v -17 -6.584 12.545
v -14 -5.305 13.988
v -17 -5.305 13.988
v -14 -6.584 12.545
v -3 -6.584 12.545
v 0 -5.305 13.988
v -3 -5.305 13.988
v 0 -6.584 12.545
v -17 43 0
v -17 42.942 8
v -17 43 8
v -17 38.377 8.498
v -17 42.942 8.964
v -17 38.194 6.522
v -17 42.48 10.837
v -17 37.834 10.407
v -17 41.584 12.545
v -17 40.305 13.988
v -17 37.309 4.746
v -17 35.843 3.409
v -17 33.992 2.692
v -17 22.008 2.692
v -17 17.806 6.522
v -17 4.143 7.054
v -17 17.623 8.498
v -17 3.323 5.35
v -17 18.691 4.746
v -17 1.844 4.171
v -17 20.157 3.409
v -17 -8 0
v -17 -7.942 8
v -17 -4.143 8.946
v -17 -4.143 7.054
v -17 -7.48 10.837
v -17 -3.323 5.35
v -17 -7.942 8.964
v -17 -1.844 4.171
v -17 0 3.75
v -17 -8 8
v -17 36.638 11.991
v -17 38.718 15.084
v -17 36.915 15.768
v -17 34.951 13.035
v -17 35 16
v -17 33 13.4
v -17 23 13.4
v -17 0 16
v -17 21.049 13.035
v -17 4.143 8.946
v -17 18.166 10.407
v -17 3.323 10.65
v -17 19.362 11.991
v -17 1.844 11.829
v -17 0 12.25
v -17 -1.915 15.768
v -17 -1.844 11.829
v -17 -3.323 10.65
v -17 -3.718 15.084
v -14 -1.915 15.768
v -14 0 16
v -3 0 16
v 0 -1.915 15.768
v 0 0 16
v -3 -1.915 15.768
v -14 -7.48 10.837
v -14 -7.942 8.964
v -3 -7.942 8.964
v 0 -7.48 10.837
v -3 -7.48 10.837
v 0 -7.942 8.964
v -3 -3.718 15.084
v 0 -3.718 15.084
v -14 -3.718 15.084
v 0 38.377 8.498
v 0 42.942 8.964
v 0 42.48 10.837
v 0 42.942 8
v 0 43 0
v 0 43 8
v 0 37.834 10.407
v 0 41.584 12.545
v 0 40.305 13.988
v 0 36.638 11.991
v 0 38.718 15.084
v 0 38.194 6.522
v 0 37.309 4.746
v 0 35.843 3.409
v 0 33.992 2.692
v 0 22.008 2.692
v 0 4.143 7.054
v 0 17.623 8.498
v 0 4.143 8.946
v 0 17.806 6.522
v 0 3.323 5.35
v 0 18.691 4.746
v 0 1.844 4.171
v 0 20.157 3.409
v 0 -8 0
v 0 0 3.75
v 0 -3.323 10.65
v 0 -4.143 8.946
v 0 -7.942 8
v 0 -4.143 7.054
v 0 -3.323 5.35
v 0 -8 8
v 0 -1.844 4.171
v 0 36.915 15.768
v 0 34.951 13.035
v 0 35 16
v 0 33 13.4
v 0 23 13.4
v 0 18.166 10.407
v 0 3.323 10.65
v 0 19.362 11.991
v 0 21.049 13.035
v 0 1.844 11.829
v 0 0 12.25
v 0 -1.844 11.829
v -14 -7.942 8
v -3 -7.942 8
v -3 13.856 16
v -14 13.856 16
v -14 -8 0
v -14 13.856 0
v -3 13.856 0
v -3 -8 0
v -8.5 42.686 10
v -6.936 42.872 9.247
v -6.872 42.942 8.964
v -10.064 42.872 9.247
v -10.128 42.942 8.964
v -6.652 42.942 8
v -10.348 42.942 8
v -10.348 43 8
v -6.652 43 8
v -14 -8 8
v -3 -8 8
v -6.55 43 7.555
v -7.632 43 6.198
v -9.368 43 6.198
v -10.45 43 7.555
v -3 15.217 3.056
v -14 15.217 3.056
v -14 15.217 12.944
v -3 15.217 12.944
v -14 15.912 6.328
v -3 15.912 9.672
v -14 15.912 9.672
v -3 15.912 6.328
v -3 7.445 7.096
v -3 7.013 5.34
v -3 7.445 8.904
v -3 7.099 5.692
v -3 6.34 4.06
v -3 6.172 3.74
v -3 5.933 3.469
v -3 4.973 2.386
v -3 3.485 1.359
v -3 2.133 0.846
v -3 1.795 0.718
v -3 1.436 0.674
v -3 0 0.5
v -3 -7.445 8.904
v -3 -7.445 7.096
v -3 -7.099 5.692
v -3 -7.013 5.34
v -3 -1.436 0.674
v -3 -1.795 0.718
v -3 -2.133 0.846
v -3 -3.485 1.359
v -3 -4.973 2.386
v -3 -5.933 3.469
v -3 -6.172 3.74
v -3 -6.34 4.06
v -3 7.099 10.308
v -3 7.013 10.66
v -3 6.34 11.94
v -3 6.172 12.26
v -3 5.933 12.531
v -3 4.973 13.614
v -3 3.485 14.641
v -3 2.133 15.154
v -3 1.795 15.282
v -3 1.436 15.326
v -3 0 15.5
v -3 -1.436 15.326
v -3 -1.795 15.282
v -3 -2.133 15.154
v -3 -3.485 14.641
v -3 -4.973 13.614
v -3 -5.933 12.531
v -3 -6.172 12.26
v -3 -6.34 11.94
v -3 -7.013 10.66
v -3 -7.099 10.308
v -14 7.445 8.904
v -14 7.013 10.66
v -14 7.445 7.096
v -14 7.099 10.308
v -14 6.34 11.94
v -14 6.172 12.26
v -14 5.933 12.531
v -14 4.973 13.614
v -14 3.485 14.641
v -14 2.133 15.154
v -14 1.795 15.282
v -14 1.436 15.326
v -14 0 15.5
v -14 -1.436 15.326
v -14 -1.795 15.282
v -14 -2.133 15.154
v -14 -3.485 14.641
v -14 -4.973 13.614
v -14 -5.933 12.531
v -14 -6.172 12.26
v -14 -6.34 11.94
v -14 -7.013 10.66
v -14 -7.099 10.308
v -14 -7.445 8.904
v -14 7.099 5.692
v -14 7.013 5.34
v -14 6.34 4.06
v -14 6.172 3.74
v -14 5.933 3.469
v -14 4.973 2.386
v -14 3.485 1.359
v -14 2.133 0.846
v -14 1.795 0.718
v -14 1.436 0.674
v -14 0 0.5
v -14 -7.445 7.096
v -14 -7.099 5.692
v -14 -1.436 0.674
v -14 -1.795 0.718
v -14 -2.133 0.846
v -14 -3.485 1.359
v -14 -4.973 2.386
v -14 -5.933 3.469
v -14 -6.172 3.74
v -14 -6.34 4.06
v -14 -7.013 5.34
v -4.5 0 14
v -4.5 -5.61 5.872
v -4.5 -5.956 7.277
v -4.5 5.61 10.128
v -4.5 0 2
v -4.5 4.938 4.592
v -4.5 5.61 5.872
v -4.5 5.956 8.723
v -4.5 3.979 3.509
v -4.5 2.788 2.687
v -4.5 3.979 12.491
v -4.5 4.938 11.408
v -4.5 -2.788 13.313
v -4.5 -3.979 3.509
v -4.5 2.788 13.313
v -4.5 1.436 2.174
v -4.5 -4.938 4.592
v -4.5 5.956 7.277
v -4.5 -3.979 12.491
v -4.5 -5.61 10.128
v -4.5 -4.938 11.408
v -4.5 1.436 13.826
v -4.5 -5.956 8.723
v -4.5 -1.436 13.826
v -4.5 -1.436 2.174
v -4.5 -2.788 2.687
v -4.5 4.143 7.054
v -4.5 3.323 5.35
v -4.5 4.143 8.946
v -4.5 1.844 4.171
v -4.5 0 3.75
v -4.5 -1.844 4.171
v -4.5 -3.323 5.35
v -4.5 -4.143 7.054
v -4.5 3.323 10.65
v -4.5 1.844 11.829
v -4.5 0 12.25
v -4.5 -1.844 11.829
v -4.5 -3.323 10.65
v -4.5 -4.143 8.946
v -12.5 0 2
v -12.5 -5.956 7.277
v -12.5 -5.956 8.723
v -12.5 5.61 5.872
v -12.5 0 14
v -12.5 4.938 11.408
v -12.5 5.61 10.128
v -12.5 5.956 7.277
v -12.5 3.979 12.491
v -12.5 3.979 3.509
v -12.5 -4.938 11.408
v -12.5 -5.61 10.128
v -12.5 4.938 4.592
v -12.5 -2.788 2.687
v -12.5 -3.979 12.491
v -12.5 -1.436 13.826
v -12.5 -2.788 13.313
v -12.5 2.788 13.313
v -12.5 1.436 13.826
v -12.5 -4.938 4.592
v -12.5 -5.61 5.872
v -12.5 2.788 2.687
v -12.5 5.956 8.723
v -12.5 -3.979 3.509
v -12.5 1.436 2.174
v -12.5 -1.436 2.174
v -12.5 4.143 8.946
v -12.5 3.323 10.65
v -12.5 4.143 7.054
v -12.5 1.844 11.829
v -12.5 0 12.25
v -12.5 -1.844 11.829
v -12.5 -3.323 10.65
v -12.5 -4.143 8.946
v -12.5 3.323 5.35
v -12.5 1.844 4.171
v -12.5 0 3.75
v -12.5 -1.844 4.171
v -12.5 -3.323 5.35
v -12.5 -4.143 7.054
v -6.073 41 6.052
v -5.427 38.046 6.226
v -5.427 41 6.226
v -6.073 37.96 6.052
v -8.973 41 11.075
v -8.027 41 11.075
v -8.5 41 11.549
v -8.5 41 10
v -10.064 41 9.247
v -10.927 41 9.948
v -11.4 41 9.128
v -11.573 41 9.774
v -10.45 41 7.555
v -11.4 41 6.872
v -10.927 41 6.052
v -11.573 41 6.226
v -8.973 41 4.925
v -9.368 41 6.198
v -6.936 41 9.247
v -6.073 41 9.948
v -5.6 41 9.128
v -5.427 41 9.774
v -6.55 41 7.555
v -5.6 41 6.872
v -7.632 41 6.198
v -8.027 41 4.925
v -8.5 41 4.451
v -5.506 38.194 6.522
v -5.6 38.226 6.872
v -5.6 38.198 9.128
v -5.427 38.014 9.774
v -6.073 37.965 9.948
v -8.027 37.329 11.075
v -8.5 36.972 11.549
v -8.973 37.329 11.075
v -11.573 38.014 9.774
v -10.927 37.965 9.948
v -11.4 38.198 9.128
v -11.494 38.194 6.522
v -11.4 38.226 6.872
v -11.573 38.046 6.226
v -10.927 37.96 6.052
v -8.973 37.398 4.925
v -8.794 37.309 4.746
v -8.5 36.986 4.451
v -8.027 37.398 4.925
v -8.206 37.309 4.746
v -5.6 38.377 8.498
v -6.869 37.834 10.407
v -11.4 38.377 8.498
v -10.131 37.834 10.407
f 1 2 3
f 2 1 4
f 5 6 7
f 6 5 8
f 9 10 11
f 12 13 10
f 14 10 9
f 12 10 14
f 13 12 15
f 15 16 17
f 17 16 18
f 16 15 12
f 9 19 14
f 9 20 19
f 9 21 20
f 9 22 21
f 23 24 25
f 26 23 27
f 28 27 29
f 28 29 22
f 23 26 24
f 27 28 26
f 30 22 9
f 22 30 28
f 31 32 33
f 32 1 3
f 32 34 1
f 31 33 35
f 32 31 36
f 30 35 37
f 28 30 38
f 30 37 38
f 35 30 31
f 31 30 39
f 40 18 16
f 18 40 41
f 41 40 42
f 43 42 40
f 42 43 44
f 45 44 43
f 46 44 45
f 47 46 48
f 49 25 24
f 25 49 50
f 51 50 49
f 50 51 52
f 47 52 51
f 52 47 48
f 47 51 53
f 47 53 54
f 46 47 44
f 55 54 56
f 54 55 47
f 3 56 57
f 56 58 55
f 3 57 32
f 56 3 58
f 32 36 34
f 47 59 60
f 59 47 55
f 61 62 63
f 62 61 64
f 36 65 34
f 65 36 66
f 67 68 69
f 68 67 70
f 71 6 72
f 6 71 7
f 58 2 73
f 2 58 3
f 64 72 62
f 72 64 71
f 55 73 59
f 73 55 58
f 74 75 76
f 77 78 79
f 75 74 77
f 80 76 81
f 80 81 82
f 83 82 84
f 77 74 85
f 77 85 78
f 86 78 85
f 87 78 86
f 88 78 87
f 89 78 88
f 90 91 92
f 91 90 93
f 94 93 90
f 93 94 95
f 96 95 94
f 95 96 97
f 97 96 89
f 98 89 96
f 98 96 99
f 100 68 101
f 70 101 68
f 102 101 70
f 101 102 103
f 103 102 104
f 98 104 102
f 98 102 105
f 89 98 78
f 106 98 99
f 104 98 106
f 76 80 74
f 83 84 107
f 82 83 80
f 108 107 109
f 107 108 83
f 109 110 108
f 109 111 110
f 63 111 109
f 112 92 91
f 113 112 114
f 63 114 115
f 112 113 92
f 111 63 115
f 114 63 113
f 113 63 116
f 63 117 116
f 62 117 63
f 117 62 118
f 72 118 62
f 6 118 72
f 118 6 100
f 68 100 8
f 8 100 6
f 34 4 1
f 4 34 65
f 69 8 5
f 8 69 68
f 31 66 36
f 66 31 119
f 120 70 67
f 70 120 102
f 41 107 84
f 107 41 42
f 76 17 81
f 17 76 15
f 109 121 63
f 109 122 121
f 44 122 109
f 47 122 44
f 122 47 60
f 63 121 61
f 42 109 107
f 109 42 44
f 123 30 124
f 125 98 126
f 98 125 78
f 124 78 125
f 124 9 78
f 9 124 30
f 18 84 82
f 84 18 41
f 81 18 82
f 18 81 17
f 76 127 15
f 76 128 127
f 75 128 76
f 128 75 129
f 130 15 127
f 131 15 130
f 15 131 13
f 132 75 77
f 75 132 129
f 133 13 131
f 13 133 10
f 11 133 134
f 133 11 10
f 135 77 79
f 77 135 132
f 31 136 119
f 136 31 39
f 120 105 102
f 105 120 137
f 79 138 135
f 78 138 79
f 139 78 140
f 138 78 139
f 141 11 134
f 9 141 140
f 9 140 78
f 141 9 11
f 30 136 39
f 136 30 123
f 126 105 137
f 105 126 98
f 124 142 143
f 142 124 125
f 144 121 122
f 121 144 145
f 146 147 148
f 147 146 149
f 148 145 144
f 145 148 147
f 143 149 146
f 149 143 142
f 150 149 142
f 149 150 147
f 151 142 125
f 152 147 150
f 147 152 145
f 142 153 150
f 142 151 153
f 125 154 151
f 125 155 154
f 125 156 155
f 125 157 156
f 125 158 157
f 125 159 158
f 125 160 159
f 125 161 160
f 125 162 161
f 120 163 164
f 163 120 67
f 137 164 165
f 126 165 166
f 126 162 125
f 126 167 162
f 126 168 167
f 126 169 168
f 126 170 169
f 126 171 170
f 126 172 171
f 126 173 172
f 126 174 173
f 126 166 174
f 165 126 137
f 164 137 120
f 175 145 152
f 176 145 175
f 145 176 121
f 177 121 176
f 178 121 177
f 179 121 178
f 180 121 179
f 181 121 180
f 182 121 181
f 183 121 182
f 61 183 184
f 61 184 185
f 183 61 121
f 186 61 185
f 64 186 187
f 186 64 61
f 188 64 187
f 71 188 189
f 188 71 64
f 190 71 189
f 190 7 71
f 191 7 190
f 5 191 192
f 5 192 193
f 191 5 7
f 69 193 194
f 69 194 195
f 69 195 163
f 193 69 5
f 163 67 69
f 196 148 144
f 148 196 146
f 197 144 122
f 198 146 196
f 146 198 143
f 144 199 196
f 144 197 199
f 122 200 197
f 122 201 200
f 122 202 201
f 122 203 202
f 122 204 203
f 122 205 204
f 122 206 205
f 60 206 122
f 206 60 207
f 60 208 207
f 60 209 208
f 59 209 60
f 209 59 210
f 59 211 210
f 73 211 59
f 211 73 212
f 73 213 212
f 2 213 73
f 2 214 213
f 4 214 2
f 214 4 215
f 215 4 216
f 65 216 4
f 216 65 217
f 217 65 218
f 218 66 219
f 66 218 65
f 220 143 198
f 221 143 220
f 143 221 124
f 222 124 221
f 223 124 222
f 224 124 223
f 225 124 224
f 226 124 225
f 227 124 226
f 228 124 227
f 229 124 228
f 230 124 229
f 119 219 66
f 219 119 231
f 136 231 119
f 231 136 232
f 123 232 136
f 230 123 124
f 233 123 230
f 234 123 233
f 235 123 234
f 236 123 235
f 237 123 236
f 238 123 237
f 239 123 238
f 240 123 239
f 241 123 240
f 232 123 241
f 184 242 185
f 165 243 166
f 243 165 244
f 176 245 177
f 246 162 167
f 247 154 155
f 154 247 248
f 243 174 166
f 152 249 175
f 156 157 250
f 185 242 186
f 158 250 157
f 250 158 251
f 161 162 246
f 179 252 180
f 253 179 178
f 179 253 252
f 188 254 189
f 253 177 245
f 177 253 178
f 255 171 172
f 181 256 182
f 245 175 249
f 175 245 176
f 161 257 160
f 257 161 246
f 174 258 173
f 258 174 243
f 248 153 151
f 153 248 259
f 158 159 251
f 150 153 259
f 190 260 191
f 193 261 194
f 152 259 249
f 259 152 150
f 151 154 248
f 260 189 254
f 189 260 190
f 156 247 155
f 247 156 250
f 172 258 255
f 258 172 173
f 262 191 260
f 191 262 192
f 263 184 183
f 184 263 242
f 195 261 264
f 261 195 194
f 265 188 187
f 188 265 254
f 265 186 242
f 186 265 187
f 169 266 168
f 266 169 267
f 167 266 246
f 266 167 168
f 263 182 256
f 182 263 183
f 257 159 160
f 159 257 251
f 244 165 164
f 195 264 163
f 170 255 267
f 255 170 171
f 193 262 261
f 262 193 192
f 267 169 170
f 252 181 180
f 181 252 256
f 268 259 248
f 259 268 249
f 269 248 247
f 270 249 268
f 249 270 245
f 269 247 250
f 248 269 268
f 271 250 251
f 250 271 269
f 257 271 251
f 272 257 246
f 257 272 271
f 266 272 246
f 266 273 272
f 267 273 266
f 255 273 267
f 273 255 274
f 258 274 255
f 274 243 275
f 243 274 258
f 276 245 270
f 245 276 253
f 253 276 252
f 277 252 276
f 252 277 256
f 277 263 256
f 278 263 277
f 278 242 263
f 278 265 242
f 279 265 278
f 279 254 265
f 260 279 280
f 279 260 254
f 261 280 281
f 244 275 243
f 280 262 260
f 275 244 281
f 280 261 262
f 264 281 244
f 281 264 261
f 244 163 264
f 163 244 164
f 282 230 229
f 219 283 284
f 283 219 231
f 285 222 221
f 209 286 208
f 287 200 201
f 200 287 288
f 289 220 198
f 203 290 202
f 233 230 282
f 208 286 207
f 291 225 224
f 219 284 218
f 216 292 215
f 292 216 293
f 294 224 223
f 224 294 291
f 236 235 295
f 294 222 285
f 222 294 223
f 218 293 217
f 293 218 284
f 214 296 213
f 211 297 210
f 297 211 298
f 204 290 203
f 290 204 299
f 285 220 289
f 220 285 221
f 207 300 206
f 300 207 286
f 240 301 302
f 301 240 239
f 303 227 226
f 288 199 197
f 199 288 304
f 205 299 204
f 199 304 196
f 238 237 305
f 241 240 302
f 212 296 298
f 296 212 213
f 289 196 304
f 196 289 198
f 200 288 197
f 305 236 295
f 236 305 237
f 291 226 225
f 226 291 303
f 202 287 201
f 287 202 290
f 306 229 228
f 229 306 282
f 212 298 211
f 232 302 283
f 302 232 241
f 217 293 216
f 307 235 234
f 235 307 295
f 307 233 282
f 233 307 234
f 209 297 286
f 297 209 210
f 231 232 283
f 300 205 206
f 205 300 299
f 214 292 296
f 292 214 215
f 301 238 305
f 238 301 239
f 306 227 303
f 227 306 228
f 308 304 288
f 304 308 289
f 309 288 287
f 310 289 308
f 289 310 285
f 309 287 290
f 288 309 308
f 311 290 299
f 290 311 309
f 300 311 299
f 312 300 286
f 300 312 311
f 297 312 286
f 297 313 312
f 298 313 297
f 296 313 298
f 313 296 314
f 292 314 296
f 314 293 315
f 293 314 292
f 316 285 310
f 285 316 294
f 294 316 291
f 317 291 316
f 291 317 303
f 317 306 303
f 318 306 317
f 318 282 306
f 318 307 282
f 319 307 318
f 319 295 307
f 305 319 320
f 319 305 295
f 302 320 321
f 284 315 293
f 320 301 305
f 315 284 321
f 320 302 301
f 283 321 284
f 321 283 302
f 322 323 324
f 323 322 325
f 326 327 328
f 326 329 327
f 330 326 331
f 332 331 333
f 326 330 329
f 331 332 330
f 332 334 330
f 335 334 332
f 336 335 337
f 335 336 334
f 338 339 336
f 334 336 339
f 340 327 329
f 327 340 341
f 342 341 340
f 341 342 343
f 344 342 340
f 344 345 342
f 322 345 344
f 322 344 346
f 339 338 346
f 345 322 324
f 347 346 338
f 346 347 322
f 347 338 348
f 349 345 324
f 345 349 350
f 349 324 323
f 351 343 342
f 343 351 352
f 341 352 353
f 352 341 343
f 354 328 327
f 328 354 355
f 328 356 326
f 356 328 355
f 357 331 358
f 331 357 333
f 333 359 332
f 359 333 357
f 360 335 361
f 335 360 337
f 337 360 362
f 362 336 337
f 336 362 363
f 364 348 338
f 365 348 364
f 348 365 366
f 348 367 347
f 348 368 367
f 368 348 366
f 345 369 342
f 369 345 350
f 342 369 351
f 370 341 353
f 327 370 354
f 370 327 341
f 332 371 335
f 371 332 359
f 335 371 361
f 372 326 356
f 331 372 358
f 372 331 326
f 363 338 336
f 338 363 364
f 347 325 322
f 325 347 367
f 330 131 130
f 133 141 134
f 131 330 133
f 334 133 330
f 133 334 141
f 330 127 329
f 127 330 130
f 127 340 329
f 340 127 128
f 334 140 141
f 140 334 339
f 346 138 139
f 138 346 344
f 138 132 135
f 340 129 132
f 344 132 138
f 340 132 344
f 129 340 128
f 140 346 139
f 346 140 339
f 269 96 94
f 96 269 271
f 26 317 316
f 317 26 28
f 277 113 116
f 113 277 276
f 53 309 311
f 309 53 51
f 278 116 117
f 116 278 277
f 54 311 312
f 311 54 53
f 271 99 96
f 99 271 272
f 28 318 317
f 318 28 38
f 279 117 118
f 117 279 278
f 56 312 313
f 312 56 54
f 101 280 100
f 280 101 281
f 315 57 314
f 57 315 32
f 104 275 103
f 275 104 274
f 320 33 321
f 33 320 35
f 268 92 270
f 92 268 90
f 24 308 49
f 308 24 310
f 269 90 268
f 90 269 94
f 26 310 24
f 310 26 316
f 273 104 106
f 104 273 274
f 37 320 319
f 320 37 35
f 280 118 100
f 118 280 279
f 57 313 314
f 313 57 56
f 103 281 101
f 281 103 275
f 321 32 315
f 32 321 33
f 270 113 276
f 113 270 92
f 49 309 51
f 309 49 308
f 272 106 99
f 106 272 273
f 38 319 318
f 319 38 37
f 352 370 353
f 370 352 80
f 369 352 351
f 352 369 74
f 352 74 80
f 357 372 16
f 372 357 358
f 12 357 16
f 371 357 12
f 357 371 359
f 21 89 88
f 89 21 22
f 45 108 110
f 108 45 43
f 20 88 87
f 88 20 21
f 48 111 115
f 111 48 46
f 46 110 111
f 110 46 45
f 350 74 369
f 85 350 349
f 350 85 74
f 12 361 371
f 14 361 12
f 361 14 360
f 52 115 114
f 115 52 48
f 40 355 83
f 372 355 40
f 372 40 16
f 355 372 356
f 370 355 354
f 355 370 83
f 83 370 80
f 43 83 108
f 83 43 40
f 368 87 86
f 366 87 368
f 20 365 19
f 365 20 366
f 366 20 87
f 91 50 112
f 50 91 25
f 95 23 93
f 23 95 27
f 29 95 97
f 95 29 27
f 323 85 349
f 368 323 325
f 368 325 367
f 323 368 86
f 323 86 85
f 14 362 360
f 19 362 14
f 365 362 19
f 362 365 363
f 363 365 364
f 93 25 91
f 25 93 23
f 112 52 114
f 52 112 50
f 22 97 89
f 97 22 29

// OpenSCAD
// PRUSA iteration3
// Y idler
// GNU GPL v3
// Josef Průša <iam@josefprusa.cz> and contributors
// http://www.reprap.org/wiki/Prusa_Mendel
// http://prusamendel.org

wall_thickness=3;
opening_width=11;
external_width=opening_width+wall_thickness*2;
opening_diameter = 32;
bearing_width = 8;
bearing_ID = 8.5;

tensionner_length = 10;

// increase the elongation if the bearing opening intersect with the M10 rod opening.
elongation = 1;


module nut(d,h,horizontal=true){
    cornerdiameter =  (d / 2) / cos (180 / 6);
    cylinder(h = h, r = cornerdiameter, $fn = 6);
    if(horizontal){
        for(i = [1:6]){
            rotate([0,0,60*i]) translate([-cornerdiameter-0.2,0,0]) rotate([0,0,-45]) cube([2,2,h]);
        }
    }
}

module y_idler_base(){
 translate(v = [0,0,0]) cylinder(h = external_width, r=8);	
 translate(v = [0,20+2+elongation+2,0]) hull() {
	cylinder(h = external_width, r=8);
	translate([0,tensionner_length,0]) cylinder(h = external_width, r=8);
 }
 translate(v = [0,10+1+elongation/2+tensionner_length/2+1,external_width/2]) cube(size = [16,22+elongation+tensionner_length+2,external_width], center=true);
 translate(v = [-4,10+1+elongation/2+tensionner_length/2+1,external_width/2]) cube(size = [8,16+22+elongation+tensionner_length+2,external_width], center=true);
}

module y_idler_holes(){
 translate(v = [0,0,-1]) cylinder(h = 120, r=bearing_ID/2);
 translate(v = [0,20+2+elongation,-1]) hull() {
	cylinder(h = 25, r=5.4);
	translate([0,tensionner_length,0]) cylinder(h = 25, r=5.4);
 }
 difference() {
   translate(v = [0,0,wall_thickness]) cylinder(h = opening_width, r=opening_diameter/2);

   // The fake bearing
   %translate([0,0,external_width/2-bearing_width/2]) cylinder(h = bearing_width, r=(22/2)+2*0.66);

   // The two bumps around the center of the bearing
   translate([0,0,wall_thickness-0.5]) cylinder(r1=15/2+0.5, r2=12/2,h=opening_width/2-bearing_width/2+0.5);
   translate([0,0,external_width-wall_thickness+0.5]) rotate([0,180,0]) cylinder(r1=15/2+0.5, r2=12/2,h=opening_width/2-bearing_width/2+0.5);
 }
 translate([0,16+22+elongation+tensionner_length+2-10,external_width/2]) rotate([90,0,0]) {
	nut(5.8,5);
	translate([0,0,-5]) cylinder(r=4/2,h=10);
 }
}

// Final part
module y_idler(){
 translate(v = [0,0,8])rotate([0,-90,0]) difference(){
  y_idler_base();
  y_idler_holes();
 }
}

y_idler();
